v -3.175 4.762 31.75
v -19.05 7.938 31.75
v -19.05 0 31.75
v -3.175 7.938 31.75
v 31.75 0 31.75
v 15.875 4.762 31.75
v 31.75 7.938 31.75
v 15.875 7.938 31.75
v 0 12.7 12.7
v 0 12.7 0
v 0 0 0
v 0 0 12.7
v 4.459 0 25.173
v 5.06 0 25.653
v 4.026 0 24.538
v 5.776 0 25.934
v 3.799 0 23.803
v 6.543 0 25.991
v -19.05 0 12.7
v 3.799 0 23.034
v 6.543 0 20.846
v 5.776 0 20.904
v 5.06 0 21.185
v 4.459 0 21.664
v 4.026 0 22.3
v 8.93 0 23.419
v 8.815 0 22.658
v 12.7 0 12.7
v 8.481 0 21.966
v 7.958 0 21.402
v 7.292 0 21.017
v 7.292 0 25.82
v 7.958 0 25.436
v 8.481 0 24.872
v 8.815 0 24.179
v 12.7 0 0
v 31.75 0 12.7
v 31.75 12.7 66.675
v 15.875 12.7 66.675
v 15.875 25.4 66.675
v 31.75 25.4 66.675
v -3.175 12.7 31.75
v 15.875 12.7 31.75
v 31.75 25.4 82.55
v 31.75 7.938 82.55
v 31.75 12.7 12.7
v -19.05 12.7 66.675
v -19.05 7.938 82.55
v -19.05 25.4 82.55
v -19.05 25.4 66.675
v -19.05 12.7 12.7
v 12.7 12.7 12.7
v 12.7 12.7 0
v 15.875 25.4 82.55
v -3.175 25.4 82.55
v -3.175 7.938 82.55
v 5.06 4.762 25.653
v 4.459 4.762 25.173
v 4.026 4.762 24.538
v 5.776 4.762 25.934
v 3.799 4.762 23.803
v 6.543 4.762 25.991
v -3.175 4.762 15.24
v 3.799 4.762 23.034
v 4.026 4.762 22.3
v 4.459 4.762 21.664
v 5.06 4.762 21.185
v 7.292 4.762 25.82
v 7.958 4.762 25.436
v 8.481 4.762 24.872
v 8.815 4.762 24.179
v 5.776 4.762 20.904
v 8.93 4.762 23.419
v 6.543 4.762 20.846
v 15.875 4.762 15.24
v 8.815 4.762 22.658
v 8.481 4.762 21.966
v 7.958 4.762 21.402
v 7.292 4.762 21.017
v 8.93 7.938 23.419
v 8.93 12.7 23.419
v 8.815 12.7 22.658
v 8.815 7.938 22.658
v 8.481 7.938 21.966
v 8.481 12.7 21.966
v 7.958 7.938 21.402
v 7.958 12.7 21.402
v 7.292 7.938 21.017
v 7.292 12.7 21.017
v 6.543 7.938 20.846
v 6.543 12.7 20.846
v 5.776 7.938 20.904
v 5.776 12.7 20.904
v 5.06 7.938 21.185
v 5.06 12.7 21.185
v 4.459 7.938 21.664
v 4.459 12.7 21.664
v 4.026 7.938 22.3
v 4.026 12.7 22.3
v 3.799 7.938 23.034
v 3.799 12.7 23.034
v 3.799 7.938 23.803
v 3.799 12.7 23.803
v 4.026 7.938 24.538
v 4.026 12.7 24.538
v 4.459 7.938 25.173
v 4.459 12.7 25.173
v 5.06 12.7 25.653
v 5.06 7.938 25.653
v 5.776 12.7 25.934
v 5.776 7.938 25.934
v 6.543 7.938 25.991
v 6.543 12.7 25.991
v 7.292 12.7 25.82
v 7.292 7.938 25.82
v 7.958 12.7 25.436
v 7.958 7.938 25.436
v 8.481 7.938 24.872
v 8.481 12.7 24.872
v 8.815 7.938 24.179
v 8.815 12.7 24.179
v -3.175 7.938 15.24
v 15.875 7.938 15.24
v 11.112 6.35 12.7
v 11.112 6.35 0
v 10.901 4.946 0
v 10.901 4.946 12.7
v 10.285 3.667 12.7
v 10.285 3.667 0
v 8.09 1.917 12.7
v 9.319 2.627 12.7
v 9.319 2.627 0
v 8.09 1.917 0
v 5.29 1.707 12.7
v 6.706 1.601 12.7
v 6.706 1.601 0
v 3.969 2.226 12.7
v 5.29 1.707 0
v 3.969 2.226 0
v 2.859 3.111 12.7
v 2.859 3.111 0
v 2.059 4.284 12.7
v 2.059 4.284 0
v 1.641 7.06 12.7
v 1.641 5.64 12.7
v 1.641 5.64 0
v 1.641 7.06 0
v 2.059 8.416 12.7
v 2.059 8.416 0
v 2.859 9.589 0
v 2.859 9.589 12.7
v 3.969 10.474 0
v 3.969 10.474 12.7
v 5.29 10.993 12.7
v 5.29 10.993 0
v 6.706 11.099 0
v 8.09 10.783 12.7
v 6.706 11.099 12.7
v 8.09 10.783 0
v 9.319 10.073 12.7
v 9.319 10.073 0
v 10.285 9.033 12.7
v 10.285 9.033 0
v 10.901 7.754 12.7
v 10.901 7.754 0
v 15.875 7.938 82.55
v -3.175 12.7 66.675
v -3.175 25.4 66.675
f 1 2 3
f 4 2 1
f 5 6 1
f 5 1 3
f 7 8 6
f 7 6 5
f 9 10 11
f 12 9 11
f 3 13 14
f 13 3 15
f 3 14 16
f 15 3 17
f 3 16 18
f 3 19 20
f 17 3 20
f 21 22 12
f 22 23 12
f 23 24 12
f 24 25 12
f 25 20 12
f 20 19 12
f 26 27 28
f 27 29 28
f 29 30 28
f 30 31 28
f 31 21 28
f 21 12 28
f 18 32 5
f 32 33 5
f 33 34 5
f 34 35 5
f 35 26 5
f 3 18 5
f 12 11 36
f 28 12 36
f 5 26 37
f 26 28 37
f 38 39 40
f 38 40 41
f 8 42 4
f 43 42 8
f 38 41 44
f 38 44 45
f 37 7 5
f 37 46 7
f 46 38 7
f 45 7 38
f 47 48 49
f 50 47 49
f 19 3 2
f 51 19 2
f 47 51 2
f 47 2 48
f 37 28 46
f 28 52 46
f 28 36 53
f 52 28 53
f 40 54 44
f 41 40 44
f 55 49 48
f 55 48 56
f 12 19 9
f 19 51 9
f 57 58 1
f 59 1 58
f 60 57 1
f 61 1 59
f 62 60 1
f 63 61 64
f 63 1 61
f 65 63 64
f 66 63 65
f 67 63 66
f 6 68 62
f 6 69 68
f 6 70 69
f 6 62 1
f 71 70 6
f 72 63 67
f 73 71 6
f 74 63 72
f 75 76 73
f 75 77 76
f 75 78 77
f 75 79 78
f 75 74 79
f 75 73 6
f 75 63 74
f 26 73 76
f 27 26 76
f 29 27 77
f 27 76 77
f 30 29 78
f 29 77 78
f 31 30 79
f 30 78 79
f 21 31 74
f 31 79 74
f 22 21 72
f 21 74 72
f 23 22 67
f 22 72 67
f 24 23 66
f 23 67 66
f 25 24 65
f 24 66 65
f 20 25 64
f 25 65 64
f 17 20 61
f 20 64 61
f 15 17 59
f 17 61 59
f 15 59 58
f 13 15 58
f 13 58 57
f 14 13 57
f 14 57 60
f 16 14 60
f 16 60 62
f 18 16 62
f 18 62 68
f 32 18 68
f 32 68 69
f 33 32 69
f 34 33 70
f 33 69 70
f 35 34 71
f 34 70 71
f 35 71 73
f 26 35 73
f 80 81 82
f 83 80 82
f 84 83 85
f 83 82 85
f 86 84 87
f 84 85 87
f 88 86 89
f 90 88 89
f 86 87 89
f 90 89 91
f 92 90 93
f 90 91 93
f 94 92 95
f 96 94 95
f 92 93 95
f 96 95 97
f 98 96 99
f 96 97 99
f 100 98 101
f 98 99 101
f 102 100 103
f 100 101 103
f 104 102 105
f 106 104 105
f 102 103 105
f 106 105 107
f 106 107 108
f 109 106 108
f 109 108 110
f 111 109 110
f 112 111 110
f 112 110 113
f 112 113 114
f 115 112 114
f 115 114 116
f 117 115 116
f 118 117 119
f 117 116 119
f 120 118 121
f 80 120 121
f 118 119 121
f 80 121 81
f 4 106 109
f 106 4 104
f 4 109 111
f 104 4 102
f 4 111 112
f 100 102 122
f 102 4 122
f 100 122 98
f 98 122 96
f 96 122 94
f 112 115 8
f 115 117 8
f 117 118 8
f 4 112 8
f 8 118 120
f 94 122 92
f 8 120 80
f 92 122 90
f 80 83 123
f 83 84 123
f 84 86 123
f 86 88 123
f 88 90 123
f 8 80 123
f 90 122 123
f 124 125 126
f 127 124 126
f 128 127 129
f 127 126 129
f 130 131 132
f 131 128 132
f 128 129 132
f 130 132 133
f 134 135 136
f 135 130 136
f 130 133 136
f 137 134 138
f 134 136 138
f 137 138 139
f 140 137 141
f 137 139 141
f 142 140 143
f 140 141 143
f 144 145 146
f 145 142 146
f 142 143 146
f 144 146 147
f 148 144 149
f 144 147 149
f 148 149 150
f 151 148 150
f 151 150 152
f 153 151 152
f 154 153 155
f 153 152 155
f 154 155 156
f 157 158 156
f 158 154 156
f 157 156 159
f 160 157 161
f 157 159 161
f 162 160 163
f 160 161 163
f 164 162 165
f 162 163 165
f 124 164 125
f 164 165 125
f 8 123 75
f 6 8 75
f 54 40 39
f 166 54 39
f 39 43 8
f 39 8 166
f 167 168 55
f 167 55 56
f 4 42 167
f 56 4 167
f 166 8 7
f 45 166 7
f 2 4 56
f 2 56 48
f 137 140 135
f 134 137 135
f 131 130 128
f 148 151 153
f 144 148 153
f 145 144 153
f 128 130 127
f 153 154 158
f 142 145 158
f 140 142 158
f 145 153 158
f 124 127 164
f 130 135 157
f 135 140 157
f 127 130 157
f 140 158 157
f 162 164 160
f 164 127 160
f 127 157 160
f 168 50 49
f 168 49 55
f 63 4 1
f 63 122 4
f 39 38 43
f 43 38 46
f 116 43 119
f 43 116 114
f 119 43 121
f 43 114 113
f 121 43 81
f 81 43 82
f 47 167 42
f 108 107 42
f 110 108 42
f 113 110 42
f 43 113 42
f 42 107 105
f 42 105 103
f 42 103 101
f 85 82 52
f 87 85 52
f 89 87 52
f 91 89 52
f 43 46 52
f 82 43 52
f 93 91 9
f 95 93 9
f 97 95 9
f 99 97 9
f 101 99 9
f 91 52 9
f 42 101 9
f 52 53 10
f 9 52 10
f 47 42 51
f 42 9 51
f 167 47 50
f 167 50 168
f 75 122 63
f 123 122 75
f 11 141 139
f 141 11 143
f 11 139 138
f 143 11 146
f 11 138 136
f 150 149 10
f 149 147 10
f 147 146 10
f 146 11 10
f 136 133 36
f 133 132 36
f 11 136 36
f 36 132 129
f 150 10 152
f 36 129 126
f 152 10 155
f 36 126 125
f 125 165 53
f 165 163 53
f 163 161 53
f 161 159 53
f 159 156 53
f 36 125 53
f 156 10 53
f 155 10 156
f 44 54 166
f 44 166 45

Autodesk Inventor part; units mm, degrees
ref_plane "YZ Plane" through (0, 0, 0) normal (1, 0, 0) x (0, 1, 0)
ref_plane "XZ Plane" through (0, 0, 0) normal (0, 1, 0) x (-1, 0, 0)
ref_plane "XY Plane" through (0, 0, 0) normal (0, 0, 1) x (1, 0, 0)
sketch "Sketch1" plane through (0, 0, 0) normal (0, 0, 1) x (1, 0, 0)
  line L0 (0, 0) -> (12.7, 0)
  line L1 (12.7, 0) -> (12.7, 12.7)
  line L2 (12.7, 12.7) -> (0, 12.7)
  line L3 (0, 12.7) -> (0, 0)
  circle A0 centre (6.35, 6.35) radius 4.7625
  dimension "d0" = 12.7
  dimension "d1" = 12.7
  dimension "d2" = 9.525
extrude "Extrusion1" add sketch "Sketch1" along normal blind 12.7
sketch "Sketch2" plane through (0, 0, 12.7) normal (0, 0, 1) x (1, 0, 0)
  line L0 (12.7, 12.7) -> (0, 12.7) projected
  line L1 (0, 12.7) -> (-19.05, 12.7)
  line L2 (0, 12.7) -> (31.75, 12.7)
  line L3 (31.75, 12.7) -> (31.75, 0)
  line L4 (31.75, 0) -> (-19.05, 0)
  line L5 (-19.05, 0) -> (-19.05, 12.7)
  line L6 (-3.175, 7.9375) -> (15.875, 7.9375)
  line L7 (-3.175, 4.7625) -> (15.875, 4.7625)
  line L8 (15.875, 7.9375) -> (15.875, 4.7625)
  line L9 (-3.175, 7.9375) -> (-3.175, 4.7625)
  point P0 (0, 0)
  dimension "d5" = 19.05
  dimension "d6" = 31.75
extrude "Extrusion2" add sketch "Sketch2" along normal blind 19.05
sketch "Sketch3" plane through (0, 0, 12.7) normal (0, 0, 1) x (1, 0, 0)
  line L0 (-3.175, 7.9375) -> (15.875, 7.9375) projected
  line L1 (15.875, 4.7625) -> (-3.175, 4.7625) projected
  line L2 (-3.175, 7.9375) -> (15.875, 7.9375)
  line L3 (15.875, 7.9375) -> (15.875, 4.7625)
  line L4 (15.875, 4.7625) -> (-3.175, 4.7625)
  line L5 (-3.175, 4.7625) -> (-3.175, 7.9375)
  point P0 (0, 0)
extrude "Extrusion3" add sketch "Sketch3" along normal blind 2.54
sketch "Sketch4" plane through (0, 12.7, 0) normal (0, 1, 0) x (1, 0, 0)
  line L0 (-3.175, -31.75) -> (15.875, -31.75) projected
  line L1 (6.35, -31.75) -> (6.35, -23.4188) construction
  circle A0 centre (6.35, -23.4188) radius 2.5797
  point P0 (0, 0)
  dimension "d15" = 8.3312
  dimension "d16" = 5.1594
extrude "Extrusion4" cut sketch "Sketch4" against normal blind 20.0025
sketch "Sketch5" plane through (0, 0, 31.75) normal (0, 0, 1) x (1, 0, 0)
  line L0 (-3.175, 4.7625) -> (-3.175, 7.9375) projected
  line L1 (-19.05, 12.7) -> (-19.05, 0) projected
  line L2 (-3.175, 7.9375) -> (-19.05, 7.9375)
  line L3 (-19.05, 7.9375) -> (-19.05, 12.7)
  line L4 (-19.05, 12.7) -> (-3.175, 12.7)
  line L5 (-3.175, 12.7) -> (-3.175, 7.9375)
  line L6 (-3.175, 7.9375) -> (15.875, 7.9375) projected
  line L7 (31.75, 12.7) -> (-19.05, 12.7) projected
  line L8 (15.875, 7.9375) -> (31.75, 7.9375)
  line L9 (31.75, 7.9375) -> (31.75, 12.7)
  line L10 (31.75, 12.7) -> (15.875, 12.7)
  line L11 (15.875, 12.7) -> (15.875, 7.9375)
  point P0 (0, 0)
extrude "Extrusion5" add sketch "Sketch5" along normal blind 50.8 contours L4 L5 L2 L1 | L7 L9 L8 L11
sketch "Sketch6" plane through (0, 12.7, 0) normal (0, 1, 0) x (1, 0, 0)
  line L0 (-3.175, -82.55) -> (-19.05, -82.55) projected
  line L1 (-3.175, -82.55) -> (-19.05, -82.55)
  line L2 (-19.05, -82.55) -> (-19.05, -66.675)
  line L3 (-19.05, -66.675) -> (-3.175, -66.675)
  line L4 (-3.175, -66.675) -> (-3.175, -82.55)
  line L5 (31.75, -12.7) -> (31.75, -82.55) projected
  line L6 (15.875, -31.75) -> (15.875, -82.55) projected
  line L7 (31.75, -82.55) -> (15.875, -82.55)
  line L8 (15.875, -82.55) -> (15.875, -66.675)
  line L9 (15.875, -66.675) -> (31.75, -66.675)
  line L10 (31.75, -66.675) -> (31.75, -82.55)
  point P0 (0, 0)
  dimension "d21" = 15.875
  dimension "d22" = 15.875
extrude "Extrusion6" add sketch "Sketch6" along normal blind 12.7
properties part number "3D Printed Y-piece"
